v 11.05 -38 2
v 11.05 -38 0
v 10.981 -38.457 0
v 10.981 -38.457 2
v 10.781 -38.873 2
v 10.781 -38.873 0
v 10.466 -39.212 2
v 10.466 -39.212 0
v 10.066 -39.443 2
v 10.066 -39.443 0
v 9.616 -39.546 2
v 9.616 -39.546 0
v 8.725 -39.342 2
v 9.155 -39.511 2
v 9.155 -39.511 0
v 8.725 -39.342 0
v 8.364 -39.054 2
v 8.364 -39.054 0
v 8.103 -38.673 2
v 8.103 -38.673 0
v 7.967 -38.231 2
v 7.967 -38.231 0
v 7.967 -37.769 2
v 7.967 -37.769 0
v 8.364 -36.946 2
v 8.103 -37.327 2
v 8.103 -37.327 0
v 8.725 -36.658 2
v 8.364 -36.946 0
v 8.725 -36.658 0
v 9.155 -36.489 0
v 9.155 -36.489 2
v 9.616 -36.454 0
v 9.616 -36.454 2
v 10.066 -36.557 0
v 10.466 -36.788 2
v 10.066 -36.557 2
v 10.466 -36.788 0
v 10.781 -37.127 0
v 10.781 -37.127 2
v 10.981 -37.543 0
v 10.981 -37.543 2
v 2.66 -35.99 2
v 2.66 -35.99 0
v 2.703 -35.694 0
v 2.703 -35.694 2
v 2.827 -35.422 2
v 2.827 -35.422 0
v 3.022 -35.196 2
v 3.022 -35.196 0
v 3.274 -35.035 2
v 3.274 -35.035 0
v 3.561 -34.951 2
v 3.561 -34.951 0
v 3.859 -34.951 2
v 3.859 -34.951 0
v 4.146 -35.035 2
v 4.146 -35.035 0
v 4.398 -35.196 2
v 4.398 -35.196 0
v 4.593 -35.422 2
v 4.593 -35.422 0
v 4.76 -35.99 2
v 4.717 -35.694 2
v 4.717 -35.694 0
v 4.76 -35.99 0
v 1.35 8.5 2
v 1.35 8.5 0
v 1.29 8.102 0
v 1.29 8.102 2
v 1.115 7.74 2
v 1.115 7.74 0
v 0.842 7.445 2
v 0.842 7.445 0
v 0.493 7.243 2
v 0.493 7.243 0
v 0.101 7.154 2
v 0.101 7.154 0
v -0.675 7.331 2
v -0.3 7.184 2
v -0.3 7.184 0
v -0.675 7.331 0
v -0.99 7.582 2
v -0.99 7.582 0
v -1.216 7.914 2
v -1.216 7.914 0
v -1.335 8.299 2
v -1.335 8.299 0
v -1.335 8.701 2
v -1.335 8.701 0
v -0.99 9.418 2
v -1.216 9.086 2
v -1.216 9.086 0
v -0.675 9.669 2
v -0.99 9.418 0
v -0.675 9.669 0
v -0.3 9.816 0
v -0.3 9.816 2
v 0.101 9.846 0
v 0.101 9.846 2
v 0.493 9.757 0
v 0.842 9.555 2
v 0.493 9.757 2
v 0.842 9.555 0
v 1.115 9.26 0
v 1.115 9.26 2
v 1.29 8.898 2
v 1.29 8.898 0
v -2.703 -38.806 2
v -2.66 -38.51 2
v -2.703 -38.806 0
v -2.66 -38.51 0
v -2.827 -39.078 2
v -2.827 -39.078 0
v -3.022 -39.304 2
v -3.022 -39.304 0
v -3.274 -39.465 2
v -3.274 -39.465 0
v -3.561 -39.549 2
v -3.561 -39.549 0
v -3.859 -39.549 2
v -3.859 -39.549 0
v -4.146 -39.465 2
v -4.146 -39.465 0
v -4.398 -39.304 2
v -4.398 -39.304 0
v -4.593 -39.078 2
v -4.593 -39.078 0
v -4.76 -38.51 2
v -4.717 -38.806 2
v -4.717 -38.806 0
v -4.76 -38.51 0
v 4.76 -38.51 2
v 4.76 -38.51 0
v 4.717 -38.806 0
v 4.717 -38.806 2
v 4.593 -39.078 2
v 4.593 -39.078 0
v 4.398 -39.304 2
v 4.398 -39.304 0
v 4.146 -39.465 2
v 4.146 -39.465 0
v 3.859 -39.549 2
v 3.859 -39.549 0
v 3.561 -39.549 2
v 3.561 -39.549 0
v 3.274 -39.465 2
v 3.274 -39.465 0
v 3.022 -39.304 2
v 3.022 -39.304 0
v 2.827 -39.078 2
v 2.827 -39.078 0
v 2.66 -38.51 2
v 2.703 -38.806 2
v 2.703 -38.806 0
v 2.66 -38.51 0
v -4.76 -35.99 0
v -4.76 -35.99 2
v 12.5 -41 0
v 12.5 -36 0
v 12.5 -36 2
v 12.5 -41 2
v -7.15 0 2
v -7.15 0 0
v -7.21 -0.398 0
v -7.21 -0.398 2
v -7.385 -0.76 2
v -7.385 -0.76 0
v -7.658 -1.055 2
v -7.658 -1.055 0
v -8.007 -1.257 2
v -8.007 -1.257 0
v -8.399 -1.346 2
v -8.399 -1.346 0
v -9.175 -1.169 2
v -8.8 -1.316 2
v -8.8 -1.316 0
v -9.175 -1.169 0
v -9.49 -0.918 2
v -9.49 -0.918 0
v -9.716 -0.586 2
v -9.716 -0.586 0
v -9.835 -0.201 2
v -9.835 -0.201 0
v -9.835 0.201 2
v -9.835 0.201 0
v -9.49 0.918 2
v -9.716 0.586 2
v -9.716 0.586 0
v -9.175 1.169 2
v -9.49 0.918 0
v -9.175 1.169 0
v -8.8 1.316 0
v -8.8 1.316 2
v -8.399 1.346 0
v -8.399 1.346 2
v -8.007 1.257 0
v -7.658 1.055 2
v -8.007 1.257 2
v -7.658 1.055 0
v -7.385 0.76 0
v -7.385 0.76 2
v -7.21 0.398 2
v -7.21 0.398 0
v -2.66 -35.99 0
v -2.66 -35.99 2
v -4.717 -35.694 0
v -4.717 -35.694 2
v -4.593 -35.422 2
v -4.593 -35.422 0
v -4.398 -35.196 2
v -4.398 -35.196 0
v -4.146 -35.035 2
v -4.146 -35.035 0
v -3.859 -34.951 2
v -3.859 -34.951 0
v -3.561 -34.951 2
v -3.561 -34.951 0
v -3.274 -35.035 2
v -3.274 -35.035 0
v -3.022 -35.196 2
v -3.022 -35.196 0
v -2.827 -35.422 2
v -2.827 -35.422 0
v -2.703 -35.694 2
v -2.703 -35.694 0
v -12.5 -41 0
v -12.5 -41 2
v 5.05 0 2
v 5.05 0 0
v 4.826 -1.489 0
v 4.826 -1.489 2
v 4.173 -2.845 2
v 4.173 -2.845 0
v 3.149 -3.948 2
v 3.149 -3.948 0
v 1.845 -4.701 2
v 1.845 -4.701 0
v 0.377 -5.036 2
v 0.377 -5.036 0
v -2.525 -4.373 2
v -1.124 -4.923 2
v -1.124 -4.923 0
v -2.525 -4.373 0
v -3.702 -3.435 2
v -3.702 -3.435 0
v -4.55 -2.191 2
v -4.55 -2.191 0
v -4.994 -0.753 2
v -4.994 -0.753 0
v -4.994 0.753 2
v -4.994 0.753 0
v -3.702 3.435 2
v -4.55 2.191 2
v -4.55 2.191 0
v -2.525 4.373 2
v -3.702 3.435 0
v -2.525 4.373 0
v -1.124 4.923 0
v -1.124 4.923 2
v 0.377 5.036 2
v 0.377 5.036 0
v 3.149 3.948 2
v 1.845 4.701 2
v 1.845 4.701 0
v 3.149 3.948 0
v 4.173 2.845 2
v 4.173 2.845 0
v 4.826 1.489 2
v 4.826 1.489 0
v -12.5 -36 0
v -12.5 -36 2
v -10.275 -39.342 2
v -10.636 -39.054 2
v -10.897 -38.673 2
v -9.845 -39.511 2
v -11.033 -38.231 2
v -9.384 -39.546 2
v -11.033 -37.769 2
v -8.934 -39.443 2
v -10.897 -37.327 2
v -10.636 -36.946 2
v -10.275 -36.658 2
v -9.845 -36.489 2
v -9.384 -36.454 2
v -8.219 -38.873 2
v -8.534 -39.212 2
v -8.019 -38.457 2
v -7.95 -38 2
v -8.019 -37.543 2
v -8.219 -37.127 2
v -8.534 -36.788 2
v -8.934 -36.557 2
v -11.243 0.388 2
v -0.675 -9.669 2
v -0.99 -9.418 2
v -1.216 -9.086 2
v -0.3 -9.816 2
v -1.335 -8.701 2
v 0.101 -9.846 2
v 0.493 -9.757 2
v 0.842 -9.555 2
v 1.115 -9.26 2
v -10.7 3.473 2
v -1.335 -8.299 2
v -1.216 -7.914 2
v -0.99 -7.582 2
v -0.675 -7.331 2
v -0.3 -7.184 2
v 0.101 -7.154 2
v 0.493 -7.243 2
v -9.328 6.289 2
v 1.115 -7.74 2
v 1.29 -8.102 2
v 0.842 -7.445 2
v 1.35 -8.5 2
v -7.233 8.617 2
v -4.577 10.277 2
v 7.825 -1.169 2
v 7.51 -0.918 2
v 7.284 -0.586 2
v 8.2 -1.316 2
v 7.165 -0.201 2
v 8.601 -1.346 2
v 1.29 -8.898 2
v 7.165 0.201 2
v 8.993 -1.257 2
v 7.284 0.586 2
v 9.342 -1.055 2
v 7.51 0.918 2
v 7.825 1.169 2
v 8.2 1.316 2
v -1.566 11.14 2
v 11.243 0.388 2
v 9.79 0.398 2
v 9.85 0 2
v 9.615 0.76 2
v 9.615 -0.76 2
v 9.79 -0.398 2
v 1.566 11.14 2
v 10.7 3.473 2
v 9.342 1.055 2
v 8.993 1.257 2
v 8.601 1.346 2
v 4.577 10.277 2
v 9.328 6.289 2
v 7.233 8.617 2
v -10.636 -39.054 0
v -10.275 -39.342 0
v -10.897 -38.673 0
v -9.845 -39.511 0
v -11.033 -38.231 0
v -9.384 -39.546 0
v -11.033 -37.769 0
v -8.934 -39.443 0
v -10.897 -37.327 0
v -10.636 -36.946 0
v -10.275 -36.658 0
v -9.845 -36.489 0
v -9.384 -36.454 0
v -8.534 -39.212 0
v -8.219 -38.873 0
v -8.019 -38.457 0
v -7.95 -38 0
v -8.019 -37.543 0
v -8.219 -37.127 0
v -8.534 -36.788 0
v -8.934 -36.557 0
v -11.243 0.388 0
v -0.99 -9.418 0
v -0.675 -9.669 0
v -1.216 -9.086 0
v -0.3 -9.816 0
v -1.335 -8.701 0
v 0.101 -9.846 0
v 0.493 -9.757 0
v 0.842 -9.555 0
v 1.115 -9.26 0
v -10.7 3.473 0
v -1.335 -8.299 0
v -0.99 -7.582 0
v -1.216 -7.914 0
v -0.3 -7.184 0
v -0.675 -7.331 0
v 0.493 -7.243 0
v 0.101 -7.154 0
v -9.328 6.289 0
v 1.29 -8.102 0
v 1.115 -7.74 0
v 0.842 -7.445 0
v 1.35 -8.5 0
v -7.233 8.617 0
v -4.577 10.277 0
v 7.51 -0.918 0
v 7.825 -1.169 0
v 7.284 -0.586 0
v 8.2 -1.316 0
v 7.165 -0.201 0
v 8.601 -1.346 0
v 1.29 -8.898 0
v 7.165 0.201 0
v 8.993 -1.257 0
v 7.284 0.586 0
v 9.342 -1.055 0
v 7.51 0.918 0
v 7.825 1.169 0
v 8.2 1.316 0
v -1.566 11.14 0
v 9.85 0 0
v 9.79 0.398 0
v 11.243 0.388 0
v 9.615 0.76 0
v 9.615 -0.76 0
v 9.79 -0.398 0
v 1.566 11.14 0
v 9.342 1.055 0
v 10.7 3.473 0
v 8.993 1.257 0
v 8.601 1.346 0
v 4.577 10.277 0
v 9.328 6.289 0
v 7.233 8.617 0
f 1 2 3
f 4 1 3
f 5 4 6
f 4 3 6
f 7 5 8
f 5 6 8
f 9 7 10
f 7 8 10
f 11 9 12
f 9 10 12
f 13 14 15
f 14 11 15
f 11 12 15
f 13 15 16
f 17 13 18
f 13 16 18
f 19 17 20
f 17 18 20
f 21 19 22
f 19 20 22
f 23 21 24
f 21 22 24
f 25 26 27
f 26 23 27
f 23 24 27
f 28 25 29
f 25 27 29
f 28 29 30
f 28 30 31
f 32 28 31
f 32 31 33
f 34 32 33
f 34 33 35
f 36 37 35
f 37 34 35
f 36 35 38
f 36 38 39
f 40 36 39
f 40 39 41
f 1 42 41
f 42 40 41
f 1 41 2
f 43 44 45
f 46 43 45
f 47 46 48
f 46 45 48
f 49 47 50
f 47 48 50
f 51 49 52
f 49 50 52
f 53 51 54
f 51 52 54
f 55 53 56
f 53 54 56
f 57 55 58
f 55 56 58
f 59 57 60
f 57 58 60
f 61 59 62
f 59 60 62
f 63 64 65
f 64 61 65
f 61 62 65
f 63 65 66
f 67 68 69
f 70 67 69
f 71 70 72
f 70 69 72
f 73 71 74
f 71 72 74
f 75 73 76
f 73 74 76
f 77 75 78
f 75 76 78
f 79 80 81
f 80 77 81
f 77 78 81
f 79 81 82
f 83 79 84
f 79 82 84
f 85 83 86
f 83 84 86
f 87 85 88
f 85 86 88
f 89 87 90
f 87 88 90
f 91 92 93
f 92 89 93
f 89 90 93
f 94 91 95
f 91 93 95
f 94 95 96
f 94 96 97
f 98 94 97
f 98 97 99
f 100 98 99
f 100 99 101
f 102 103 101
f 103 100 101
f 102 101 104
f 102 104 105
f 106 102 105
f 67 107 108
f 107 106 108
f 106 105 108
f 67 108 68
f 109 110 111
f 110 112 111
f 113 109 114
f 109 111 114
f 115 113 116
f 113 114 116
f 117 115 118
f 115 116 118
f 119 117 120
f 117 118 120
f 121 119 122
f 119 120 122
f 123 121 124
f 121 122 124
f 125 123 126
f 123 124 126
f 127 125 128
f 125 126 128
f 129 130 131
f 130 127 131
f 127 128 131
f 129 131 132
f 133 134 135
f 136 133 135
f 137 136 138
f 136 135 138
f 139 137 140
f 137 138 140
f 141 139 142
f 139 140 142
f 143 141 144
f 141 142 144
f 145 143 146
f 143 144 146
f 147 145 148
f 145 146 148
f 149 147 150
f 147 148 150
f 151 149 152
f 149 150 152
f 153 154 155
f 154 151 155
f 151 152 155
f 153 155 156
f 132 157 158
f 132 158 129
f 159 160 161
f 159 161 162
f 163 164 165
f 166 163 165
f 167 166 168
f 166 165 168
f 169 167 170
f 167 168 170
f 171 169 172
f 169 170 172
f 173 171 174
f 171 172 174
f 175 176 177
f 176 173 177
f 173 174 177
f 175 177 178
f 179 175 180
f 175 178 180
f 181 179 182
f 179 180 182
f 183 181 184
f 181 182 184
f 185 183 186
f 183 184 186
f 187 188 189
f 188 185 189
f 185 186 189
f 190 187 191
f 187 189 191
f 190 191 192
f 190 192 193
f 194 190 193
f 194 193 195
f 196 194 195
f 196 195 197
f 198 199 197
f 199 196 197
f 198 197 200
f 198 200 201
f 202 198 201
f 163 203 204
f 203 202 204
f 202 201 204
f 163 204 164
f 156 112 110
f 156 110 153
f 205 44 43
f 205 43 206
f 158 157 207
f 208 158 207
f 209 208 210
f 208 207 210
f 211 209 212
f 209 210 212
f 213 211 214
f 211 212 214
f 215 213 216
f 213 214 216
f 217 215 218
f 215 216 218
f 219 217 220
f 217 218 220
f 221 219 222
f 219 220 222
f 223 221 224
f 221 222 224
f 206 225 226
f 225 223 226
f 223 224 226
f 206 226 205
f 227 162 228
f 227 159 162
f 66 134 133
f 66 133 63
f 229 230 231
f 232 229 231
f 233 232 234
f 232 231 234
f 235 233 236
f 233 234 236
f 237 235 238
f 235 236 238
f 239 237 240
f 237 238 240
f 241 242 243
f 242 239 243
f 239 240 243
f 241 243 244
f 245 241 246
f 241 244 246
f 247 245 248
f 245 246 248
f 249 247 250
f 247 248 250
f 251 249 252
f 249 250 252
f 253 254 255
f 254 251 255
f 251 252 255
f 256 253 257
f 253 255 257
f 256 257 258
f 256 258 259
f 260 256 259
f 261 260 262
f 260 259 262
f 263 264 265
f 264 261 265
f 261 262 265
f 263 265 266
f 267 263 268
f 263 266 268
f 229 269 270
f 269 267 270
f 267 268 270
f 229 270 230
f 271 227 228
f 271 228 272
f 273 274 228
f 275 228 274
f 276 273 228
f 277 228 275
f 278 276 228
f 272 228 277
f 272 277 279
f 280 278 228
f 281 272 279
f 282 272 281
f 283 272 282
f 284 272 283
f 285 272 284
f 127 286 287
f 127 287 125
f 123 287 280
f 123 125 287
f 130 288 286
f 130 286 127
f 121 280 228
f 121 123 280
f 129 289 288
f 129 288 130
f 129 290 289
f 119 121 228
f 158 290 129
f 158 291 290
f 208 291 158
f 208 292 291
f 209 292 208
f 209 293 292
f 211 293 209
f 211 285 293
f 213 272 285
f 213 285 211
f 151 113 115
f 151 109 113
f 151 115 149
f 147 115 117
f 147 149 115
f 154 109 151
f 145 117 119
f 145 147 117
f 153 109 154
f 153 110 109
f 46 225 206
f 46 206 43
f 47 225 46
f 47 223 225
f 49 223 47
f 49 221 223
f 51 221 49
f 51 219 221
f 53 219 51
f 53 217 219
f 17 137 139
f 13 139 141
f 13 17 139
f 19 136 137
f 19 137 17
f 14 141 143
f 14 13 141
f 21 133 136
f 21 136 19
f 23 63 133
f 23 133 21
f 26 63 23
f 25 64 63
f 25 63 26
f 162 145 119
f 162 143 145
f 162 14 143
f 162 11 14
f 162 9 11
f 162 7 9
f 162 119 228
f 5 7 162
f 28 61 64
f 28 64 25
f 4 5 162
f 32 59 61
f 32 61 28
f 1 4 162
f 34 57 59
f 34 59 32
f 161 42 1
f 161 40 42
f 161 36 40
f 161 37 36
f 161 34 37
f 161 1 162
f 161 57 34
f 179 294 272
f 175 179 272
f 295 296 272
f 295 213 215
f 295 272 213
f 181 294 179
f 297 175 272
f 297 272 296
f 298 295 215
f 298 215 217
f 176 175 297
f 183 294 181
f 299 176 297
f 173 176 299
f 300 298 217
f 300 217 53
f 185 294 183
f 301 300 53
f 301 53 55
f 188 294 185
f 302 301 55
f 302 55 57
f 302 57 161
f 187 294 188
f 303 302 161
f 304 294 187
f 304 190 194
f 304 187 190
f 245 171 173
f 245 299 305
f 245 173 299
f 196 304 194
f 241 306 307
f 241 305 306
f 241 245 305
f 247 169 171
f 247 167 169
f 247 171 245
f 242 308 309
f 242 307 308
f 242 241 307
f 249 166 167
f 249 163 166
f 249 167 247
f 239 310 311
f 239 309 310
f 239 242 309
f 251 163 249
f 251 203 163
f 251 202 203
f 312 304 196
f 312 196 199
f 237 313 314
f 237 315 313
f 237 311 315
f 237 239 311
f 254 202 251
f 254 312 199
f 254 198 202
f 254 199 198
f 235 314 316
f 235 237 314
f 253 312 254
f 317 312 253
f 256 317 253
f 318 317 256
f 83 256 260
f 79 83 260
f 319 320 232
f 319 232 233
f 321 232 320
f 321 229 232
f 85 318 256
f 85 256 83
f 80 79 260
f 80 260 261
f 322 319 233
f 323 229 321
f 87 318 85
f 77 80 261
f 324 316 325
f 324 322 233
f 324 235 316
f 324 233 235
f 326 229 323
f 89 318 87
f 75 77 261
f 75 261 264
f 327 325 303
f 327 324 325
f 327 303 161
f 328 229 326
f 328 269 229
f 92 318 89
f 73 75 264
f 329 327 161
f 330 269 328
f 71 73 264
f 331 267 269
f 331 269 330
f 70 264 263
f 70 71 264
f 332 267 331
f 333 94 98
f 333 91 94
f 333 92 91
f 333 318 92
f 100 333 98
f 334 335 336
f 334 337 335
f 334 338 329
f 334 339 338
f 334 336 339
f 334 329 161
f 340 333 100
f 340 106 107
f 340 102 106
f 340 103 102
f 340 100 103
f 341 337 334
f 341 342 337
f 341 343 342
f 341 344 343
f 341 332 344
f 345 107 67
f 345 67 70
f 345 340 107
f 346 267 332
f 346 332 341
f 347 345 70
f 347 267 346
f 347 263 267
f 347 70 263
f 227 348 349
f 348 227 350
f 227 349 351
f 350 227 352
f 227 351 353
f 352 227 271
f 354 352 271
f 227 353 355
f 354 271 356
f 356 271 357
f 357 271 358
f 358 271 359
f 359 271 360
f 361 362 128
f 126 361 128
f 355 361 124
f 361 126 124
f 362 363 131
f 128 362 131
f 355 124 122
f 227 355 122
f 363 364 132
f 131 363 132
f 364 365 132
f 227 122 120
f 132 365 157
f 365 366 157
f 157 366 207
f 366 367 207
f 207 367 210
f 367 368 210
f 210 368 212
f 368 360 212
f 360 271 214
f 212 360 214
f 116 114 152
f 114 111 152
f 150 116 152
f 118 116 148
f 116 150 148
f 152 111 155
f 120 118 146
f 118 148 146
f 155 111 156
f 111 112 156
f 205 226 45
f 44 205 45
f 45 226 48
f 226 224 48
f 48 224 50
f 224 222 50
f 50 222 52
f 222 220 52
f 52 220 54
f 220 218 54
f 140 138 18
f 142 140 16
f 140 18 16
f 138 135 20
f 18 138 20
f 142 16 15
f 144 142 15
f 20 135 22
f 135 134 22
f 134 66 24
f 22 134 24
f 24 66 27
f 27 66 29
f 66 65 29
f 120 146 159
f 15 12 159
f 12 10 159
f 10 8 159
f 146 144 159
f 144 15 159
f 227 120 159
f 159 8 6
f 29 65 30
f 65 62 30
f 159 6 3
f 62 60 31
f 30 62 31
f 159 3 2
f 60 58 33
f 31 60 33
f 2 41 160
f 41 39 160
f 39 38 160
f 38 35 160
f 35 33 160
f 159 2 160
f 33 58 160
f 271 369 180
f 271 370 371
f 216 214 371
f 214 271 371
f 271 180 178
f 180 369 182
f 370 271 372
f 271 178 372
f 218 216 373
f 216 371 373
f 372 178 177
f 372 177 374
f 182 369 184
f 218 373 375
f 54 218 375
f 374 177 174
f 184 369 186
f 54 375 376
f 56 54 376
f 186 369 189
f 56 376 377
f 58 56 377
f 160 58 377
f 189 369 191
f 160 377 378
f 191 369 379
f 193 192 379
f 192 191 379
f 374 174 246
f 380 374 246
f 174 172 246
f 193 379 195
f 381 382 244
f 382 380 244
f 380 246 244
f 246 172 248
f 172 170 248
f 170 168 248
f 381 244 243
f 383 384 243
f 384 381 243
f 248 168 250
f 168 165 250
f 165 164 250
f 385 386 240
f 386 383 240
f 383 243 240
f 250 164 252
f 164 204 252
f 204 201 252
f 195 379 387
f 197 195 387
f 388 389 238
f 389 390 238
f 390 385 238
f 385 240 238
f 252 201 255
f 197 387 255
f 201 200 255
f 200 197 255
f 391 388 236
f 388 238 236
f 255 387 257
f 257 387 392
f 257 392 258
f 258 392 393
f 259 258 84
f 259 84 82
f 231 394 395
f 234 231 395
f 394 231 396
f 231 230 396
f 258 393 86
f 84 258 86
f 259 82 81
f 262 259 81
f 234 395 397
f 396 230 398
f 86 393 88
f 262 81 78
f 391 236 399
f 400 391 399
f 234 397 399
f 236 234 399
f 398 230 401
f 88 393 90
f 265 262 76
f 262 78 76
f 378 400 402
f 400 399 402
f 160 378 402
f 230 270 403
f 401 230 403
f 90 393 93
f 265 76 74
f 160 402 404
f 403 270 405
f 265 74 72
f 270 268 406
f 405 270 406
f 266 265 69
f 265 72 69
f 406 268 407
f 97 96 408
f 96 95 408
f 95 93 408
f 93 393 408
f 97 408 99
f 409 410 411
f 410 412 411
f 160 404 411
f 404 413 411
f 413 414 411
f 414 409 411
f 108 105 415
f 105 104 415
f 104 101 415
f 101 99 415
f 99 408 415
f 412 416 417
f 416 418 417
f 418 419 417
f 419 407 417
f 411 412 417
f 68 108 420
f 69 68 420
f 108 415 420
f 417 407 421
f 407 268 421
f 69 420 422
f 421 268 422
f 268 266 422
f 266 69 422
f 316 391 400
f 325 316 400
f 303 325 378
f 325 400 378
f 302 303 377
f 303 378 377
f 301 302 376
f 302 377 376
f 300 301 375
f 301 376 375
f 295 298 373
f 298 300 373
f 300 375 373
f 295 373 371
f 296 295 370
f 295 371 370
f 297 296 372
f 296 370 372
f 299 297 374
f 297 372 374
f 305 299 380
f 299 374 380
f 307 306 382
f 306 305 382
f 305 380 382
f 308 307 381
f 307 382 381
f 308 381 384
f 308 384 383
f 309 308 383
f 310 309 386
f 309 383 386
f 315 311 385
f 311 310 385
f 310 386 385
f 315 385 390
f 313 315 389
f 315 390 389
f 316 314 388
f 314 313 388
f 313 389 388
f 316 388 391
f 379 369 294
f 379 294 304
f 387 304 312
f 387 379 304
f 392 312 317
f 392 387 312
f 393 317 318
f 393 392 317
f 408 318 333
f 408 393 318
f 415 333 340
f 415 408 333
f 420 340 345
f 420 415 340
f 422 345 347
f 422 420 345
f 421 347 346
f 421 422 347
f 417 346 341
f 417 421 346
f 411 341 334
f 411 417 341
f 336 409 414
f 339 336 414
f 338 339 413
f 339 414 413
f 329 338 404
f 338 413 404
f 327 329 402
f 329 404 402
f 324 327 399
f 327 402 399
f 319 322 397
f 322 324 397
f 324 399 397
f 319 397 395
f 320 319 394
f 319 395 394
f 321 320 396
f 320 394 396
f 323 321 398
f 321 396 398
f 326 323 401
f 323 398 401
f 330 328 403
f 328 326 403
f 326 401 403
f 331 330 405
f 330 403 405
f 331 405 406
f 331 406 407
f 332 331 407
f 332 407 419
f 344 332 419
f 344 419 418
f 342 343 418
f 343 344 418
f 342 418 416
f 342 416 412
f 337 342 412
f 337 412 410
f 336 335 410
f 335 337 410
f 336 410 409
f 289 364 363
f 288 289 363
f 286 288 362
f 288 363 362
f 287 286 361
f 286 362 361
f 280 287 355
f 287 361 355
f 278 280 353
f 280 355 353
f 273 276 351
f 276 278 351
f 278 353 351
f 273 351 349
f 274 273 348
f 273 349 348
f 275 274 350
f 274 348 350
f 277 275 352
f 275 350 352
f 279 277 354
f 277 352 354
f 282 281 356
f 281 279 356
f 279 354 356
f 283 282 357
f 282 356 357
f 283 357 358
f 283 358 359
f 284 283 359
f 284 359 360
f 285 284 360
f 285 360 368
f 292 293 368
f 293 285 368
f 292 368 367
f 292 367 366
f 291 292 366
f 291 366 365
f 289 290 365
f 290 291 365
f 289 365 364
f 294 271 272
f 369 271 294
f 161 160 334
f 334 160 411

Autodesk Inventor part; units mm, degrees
ref_plane "YZ Plane" through (0, 0, 0) normal (1, 0, 0) x (0, 1, 0)
ref_plane "XZ Plane" through (0, 0, 0) normal (0, 1, 0) x (-1, 0, 0)
ref_plane "XY Plane" through (0, 0, 0) normal (0, 0, 1) x (1, 0, 0)
sketch "スケッチ1" plane through (0, 0, 0) normal (0, 0, 1) x (1, 0, 0)
  line L0 (-63.6765, 0) -> (66.53, 0) construction
  line L1 (0, 73.5962) -> (0, -63.7716) construction
  circle A0 centre (0, 0) radius 5.05
  circle A1 centre (0, 0) radius 8 construction
  circle A2 centre (0, 0) radius 11.25
  circle A3 centre (0, 8.5) radius 1.35
  circle A4 centre (0, 8.5) radius 2.75 construction
  circle A5 centre (-8.5, 0) radius 2.75 construction
  circle A6 centre (-8.5, 0) radius 1.35
  circle A7 centre (0, -8.5) radius 2.75 construction
  circle A8 centre (0, -8.5) radius 1.35
  circle A9 centre (8.5, 0) radius 2.75 construction
  circle A10 centre (8.5, 0) radius 1.35
  line L2 (12.5, -41) -> (-12.5, -41)
  line L3 (-12.5, -41) -> (-12.5, -36)
  line L4 (-12.5, -36) -> (12.5, -36) construction
  line L5 (12.5, -36) -> (12.5, -41)
  line L6 (12.5, -41) -> (-12.5, -36) construction
  line L7 (-12.5, -41) -> (12.5, -36) construction
  line L8 (12.5, -36) -> (11.2433, 0.3883)
  line L9 (-12.5, -36) -> (-11.2433, 0.3883)
  circle A11 centre (-9.5, -38) radius 1.55
  line L10 (-12.5, -38) -> (12.5, -38) construction
  line L11 (-4.75, -36) -> (-4.75, -41) construction
  line L12 (4.75, -36) -> (4.75, -41) construction
  circle A12 centre (9.5, -38) radius 1.55
  line L13 (-4.75, -36) -> (4.75, -36) construction
  line L14 (4.75, -36) -> (4.75, -38.5) construction
  line L15 (4.75, -38.5) -> (-4.75, -38.5) construction
  line L16 (-4.75, -38.5) -> (-4.75, -36) construction
  line L17 (-4.75, -37.25) -> (4.75, -37.25) construction
  line L18 (-4.76, -38.51) -> (4.76, -38.51)
  line L19 (4.76, -38.51) -> (4.76, -35.99)
  line L20 (4.76, -35.99) -> (-4.76, -35.99)
  line L21 (-4.76, -35.99) -> (-4.76, -38.51)
  circle A13 centre (-3.71, -35.99) radius 1.05
  circle A14 centre (-3.71, -38.51) radius 1.05
  circle A15 centre (3.71, -35.99) radius 1.05
  circle A16 centre (3.71, -38.51) radius 1.05
  point P0 (0, -38.5)
  point P1 (4.75, -36)
  point P2 (2.66, -38.51)
  point P3 (-2.66, -38.51)
  point P4 (-2.66, -35.99)
  point P5 (2.66, -35.99)
  dimension "d0" = 10.1
  dimension "d1" = 16
  dimension "d4" = 2.7
  dimension "d5" = 8.5
  dimension "d6" = 5.5
  dimension "d7" = 22.5
  dimension "d10" = 360
  dimension "d12" = 25
  dimension "d13" = 5
  dimension "d14" = 36
  dimension "d15" = 3
  dimension "d16" = 9.5
  dimension "d17" = 3.1
  dimension "d18" = 3
  dimension "d19" = 4.75
  dimension "d30" = 19
  dimension "d39" = 0.01
  dimension "d40" = 1.05
  dimension "d41" = 2.1
extrude "押し出し1" add sketch "スケッチ1" along normal blind 2
equation "\"d19\" = 0.5 * d16"
properties part number "Foot_roll_vertical_02" material "アルミニウム 2014-T4"
